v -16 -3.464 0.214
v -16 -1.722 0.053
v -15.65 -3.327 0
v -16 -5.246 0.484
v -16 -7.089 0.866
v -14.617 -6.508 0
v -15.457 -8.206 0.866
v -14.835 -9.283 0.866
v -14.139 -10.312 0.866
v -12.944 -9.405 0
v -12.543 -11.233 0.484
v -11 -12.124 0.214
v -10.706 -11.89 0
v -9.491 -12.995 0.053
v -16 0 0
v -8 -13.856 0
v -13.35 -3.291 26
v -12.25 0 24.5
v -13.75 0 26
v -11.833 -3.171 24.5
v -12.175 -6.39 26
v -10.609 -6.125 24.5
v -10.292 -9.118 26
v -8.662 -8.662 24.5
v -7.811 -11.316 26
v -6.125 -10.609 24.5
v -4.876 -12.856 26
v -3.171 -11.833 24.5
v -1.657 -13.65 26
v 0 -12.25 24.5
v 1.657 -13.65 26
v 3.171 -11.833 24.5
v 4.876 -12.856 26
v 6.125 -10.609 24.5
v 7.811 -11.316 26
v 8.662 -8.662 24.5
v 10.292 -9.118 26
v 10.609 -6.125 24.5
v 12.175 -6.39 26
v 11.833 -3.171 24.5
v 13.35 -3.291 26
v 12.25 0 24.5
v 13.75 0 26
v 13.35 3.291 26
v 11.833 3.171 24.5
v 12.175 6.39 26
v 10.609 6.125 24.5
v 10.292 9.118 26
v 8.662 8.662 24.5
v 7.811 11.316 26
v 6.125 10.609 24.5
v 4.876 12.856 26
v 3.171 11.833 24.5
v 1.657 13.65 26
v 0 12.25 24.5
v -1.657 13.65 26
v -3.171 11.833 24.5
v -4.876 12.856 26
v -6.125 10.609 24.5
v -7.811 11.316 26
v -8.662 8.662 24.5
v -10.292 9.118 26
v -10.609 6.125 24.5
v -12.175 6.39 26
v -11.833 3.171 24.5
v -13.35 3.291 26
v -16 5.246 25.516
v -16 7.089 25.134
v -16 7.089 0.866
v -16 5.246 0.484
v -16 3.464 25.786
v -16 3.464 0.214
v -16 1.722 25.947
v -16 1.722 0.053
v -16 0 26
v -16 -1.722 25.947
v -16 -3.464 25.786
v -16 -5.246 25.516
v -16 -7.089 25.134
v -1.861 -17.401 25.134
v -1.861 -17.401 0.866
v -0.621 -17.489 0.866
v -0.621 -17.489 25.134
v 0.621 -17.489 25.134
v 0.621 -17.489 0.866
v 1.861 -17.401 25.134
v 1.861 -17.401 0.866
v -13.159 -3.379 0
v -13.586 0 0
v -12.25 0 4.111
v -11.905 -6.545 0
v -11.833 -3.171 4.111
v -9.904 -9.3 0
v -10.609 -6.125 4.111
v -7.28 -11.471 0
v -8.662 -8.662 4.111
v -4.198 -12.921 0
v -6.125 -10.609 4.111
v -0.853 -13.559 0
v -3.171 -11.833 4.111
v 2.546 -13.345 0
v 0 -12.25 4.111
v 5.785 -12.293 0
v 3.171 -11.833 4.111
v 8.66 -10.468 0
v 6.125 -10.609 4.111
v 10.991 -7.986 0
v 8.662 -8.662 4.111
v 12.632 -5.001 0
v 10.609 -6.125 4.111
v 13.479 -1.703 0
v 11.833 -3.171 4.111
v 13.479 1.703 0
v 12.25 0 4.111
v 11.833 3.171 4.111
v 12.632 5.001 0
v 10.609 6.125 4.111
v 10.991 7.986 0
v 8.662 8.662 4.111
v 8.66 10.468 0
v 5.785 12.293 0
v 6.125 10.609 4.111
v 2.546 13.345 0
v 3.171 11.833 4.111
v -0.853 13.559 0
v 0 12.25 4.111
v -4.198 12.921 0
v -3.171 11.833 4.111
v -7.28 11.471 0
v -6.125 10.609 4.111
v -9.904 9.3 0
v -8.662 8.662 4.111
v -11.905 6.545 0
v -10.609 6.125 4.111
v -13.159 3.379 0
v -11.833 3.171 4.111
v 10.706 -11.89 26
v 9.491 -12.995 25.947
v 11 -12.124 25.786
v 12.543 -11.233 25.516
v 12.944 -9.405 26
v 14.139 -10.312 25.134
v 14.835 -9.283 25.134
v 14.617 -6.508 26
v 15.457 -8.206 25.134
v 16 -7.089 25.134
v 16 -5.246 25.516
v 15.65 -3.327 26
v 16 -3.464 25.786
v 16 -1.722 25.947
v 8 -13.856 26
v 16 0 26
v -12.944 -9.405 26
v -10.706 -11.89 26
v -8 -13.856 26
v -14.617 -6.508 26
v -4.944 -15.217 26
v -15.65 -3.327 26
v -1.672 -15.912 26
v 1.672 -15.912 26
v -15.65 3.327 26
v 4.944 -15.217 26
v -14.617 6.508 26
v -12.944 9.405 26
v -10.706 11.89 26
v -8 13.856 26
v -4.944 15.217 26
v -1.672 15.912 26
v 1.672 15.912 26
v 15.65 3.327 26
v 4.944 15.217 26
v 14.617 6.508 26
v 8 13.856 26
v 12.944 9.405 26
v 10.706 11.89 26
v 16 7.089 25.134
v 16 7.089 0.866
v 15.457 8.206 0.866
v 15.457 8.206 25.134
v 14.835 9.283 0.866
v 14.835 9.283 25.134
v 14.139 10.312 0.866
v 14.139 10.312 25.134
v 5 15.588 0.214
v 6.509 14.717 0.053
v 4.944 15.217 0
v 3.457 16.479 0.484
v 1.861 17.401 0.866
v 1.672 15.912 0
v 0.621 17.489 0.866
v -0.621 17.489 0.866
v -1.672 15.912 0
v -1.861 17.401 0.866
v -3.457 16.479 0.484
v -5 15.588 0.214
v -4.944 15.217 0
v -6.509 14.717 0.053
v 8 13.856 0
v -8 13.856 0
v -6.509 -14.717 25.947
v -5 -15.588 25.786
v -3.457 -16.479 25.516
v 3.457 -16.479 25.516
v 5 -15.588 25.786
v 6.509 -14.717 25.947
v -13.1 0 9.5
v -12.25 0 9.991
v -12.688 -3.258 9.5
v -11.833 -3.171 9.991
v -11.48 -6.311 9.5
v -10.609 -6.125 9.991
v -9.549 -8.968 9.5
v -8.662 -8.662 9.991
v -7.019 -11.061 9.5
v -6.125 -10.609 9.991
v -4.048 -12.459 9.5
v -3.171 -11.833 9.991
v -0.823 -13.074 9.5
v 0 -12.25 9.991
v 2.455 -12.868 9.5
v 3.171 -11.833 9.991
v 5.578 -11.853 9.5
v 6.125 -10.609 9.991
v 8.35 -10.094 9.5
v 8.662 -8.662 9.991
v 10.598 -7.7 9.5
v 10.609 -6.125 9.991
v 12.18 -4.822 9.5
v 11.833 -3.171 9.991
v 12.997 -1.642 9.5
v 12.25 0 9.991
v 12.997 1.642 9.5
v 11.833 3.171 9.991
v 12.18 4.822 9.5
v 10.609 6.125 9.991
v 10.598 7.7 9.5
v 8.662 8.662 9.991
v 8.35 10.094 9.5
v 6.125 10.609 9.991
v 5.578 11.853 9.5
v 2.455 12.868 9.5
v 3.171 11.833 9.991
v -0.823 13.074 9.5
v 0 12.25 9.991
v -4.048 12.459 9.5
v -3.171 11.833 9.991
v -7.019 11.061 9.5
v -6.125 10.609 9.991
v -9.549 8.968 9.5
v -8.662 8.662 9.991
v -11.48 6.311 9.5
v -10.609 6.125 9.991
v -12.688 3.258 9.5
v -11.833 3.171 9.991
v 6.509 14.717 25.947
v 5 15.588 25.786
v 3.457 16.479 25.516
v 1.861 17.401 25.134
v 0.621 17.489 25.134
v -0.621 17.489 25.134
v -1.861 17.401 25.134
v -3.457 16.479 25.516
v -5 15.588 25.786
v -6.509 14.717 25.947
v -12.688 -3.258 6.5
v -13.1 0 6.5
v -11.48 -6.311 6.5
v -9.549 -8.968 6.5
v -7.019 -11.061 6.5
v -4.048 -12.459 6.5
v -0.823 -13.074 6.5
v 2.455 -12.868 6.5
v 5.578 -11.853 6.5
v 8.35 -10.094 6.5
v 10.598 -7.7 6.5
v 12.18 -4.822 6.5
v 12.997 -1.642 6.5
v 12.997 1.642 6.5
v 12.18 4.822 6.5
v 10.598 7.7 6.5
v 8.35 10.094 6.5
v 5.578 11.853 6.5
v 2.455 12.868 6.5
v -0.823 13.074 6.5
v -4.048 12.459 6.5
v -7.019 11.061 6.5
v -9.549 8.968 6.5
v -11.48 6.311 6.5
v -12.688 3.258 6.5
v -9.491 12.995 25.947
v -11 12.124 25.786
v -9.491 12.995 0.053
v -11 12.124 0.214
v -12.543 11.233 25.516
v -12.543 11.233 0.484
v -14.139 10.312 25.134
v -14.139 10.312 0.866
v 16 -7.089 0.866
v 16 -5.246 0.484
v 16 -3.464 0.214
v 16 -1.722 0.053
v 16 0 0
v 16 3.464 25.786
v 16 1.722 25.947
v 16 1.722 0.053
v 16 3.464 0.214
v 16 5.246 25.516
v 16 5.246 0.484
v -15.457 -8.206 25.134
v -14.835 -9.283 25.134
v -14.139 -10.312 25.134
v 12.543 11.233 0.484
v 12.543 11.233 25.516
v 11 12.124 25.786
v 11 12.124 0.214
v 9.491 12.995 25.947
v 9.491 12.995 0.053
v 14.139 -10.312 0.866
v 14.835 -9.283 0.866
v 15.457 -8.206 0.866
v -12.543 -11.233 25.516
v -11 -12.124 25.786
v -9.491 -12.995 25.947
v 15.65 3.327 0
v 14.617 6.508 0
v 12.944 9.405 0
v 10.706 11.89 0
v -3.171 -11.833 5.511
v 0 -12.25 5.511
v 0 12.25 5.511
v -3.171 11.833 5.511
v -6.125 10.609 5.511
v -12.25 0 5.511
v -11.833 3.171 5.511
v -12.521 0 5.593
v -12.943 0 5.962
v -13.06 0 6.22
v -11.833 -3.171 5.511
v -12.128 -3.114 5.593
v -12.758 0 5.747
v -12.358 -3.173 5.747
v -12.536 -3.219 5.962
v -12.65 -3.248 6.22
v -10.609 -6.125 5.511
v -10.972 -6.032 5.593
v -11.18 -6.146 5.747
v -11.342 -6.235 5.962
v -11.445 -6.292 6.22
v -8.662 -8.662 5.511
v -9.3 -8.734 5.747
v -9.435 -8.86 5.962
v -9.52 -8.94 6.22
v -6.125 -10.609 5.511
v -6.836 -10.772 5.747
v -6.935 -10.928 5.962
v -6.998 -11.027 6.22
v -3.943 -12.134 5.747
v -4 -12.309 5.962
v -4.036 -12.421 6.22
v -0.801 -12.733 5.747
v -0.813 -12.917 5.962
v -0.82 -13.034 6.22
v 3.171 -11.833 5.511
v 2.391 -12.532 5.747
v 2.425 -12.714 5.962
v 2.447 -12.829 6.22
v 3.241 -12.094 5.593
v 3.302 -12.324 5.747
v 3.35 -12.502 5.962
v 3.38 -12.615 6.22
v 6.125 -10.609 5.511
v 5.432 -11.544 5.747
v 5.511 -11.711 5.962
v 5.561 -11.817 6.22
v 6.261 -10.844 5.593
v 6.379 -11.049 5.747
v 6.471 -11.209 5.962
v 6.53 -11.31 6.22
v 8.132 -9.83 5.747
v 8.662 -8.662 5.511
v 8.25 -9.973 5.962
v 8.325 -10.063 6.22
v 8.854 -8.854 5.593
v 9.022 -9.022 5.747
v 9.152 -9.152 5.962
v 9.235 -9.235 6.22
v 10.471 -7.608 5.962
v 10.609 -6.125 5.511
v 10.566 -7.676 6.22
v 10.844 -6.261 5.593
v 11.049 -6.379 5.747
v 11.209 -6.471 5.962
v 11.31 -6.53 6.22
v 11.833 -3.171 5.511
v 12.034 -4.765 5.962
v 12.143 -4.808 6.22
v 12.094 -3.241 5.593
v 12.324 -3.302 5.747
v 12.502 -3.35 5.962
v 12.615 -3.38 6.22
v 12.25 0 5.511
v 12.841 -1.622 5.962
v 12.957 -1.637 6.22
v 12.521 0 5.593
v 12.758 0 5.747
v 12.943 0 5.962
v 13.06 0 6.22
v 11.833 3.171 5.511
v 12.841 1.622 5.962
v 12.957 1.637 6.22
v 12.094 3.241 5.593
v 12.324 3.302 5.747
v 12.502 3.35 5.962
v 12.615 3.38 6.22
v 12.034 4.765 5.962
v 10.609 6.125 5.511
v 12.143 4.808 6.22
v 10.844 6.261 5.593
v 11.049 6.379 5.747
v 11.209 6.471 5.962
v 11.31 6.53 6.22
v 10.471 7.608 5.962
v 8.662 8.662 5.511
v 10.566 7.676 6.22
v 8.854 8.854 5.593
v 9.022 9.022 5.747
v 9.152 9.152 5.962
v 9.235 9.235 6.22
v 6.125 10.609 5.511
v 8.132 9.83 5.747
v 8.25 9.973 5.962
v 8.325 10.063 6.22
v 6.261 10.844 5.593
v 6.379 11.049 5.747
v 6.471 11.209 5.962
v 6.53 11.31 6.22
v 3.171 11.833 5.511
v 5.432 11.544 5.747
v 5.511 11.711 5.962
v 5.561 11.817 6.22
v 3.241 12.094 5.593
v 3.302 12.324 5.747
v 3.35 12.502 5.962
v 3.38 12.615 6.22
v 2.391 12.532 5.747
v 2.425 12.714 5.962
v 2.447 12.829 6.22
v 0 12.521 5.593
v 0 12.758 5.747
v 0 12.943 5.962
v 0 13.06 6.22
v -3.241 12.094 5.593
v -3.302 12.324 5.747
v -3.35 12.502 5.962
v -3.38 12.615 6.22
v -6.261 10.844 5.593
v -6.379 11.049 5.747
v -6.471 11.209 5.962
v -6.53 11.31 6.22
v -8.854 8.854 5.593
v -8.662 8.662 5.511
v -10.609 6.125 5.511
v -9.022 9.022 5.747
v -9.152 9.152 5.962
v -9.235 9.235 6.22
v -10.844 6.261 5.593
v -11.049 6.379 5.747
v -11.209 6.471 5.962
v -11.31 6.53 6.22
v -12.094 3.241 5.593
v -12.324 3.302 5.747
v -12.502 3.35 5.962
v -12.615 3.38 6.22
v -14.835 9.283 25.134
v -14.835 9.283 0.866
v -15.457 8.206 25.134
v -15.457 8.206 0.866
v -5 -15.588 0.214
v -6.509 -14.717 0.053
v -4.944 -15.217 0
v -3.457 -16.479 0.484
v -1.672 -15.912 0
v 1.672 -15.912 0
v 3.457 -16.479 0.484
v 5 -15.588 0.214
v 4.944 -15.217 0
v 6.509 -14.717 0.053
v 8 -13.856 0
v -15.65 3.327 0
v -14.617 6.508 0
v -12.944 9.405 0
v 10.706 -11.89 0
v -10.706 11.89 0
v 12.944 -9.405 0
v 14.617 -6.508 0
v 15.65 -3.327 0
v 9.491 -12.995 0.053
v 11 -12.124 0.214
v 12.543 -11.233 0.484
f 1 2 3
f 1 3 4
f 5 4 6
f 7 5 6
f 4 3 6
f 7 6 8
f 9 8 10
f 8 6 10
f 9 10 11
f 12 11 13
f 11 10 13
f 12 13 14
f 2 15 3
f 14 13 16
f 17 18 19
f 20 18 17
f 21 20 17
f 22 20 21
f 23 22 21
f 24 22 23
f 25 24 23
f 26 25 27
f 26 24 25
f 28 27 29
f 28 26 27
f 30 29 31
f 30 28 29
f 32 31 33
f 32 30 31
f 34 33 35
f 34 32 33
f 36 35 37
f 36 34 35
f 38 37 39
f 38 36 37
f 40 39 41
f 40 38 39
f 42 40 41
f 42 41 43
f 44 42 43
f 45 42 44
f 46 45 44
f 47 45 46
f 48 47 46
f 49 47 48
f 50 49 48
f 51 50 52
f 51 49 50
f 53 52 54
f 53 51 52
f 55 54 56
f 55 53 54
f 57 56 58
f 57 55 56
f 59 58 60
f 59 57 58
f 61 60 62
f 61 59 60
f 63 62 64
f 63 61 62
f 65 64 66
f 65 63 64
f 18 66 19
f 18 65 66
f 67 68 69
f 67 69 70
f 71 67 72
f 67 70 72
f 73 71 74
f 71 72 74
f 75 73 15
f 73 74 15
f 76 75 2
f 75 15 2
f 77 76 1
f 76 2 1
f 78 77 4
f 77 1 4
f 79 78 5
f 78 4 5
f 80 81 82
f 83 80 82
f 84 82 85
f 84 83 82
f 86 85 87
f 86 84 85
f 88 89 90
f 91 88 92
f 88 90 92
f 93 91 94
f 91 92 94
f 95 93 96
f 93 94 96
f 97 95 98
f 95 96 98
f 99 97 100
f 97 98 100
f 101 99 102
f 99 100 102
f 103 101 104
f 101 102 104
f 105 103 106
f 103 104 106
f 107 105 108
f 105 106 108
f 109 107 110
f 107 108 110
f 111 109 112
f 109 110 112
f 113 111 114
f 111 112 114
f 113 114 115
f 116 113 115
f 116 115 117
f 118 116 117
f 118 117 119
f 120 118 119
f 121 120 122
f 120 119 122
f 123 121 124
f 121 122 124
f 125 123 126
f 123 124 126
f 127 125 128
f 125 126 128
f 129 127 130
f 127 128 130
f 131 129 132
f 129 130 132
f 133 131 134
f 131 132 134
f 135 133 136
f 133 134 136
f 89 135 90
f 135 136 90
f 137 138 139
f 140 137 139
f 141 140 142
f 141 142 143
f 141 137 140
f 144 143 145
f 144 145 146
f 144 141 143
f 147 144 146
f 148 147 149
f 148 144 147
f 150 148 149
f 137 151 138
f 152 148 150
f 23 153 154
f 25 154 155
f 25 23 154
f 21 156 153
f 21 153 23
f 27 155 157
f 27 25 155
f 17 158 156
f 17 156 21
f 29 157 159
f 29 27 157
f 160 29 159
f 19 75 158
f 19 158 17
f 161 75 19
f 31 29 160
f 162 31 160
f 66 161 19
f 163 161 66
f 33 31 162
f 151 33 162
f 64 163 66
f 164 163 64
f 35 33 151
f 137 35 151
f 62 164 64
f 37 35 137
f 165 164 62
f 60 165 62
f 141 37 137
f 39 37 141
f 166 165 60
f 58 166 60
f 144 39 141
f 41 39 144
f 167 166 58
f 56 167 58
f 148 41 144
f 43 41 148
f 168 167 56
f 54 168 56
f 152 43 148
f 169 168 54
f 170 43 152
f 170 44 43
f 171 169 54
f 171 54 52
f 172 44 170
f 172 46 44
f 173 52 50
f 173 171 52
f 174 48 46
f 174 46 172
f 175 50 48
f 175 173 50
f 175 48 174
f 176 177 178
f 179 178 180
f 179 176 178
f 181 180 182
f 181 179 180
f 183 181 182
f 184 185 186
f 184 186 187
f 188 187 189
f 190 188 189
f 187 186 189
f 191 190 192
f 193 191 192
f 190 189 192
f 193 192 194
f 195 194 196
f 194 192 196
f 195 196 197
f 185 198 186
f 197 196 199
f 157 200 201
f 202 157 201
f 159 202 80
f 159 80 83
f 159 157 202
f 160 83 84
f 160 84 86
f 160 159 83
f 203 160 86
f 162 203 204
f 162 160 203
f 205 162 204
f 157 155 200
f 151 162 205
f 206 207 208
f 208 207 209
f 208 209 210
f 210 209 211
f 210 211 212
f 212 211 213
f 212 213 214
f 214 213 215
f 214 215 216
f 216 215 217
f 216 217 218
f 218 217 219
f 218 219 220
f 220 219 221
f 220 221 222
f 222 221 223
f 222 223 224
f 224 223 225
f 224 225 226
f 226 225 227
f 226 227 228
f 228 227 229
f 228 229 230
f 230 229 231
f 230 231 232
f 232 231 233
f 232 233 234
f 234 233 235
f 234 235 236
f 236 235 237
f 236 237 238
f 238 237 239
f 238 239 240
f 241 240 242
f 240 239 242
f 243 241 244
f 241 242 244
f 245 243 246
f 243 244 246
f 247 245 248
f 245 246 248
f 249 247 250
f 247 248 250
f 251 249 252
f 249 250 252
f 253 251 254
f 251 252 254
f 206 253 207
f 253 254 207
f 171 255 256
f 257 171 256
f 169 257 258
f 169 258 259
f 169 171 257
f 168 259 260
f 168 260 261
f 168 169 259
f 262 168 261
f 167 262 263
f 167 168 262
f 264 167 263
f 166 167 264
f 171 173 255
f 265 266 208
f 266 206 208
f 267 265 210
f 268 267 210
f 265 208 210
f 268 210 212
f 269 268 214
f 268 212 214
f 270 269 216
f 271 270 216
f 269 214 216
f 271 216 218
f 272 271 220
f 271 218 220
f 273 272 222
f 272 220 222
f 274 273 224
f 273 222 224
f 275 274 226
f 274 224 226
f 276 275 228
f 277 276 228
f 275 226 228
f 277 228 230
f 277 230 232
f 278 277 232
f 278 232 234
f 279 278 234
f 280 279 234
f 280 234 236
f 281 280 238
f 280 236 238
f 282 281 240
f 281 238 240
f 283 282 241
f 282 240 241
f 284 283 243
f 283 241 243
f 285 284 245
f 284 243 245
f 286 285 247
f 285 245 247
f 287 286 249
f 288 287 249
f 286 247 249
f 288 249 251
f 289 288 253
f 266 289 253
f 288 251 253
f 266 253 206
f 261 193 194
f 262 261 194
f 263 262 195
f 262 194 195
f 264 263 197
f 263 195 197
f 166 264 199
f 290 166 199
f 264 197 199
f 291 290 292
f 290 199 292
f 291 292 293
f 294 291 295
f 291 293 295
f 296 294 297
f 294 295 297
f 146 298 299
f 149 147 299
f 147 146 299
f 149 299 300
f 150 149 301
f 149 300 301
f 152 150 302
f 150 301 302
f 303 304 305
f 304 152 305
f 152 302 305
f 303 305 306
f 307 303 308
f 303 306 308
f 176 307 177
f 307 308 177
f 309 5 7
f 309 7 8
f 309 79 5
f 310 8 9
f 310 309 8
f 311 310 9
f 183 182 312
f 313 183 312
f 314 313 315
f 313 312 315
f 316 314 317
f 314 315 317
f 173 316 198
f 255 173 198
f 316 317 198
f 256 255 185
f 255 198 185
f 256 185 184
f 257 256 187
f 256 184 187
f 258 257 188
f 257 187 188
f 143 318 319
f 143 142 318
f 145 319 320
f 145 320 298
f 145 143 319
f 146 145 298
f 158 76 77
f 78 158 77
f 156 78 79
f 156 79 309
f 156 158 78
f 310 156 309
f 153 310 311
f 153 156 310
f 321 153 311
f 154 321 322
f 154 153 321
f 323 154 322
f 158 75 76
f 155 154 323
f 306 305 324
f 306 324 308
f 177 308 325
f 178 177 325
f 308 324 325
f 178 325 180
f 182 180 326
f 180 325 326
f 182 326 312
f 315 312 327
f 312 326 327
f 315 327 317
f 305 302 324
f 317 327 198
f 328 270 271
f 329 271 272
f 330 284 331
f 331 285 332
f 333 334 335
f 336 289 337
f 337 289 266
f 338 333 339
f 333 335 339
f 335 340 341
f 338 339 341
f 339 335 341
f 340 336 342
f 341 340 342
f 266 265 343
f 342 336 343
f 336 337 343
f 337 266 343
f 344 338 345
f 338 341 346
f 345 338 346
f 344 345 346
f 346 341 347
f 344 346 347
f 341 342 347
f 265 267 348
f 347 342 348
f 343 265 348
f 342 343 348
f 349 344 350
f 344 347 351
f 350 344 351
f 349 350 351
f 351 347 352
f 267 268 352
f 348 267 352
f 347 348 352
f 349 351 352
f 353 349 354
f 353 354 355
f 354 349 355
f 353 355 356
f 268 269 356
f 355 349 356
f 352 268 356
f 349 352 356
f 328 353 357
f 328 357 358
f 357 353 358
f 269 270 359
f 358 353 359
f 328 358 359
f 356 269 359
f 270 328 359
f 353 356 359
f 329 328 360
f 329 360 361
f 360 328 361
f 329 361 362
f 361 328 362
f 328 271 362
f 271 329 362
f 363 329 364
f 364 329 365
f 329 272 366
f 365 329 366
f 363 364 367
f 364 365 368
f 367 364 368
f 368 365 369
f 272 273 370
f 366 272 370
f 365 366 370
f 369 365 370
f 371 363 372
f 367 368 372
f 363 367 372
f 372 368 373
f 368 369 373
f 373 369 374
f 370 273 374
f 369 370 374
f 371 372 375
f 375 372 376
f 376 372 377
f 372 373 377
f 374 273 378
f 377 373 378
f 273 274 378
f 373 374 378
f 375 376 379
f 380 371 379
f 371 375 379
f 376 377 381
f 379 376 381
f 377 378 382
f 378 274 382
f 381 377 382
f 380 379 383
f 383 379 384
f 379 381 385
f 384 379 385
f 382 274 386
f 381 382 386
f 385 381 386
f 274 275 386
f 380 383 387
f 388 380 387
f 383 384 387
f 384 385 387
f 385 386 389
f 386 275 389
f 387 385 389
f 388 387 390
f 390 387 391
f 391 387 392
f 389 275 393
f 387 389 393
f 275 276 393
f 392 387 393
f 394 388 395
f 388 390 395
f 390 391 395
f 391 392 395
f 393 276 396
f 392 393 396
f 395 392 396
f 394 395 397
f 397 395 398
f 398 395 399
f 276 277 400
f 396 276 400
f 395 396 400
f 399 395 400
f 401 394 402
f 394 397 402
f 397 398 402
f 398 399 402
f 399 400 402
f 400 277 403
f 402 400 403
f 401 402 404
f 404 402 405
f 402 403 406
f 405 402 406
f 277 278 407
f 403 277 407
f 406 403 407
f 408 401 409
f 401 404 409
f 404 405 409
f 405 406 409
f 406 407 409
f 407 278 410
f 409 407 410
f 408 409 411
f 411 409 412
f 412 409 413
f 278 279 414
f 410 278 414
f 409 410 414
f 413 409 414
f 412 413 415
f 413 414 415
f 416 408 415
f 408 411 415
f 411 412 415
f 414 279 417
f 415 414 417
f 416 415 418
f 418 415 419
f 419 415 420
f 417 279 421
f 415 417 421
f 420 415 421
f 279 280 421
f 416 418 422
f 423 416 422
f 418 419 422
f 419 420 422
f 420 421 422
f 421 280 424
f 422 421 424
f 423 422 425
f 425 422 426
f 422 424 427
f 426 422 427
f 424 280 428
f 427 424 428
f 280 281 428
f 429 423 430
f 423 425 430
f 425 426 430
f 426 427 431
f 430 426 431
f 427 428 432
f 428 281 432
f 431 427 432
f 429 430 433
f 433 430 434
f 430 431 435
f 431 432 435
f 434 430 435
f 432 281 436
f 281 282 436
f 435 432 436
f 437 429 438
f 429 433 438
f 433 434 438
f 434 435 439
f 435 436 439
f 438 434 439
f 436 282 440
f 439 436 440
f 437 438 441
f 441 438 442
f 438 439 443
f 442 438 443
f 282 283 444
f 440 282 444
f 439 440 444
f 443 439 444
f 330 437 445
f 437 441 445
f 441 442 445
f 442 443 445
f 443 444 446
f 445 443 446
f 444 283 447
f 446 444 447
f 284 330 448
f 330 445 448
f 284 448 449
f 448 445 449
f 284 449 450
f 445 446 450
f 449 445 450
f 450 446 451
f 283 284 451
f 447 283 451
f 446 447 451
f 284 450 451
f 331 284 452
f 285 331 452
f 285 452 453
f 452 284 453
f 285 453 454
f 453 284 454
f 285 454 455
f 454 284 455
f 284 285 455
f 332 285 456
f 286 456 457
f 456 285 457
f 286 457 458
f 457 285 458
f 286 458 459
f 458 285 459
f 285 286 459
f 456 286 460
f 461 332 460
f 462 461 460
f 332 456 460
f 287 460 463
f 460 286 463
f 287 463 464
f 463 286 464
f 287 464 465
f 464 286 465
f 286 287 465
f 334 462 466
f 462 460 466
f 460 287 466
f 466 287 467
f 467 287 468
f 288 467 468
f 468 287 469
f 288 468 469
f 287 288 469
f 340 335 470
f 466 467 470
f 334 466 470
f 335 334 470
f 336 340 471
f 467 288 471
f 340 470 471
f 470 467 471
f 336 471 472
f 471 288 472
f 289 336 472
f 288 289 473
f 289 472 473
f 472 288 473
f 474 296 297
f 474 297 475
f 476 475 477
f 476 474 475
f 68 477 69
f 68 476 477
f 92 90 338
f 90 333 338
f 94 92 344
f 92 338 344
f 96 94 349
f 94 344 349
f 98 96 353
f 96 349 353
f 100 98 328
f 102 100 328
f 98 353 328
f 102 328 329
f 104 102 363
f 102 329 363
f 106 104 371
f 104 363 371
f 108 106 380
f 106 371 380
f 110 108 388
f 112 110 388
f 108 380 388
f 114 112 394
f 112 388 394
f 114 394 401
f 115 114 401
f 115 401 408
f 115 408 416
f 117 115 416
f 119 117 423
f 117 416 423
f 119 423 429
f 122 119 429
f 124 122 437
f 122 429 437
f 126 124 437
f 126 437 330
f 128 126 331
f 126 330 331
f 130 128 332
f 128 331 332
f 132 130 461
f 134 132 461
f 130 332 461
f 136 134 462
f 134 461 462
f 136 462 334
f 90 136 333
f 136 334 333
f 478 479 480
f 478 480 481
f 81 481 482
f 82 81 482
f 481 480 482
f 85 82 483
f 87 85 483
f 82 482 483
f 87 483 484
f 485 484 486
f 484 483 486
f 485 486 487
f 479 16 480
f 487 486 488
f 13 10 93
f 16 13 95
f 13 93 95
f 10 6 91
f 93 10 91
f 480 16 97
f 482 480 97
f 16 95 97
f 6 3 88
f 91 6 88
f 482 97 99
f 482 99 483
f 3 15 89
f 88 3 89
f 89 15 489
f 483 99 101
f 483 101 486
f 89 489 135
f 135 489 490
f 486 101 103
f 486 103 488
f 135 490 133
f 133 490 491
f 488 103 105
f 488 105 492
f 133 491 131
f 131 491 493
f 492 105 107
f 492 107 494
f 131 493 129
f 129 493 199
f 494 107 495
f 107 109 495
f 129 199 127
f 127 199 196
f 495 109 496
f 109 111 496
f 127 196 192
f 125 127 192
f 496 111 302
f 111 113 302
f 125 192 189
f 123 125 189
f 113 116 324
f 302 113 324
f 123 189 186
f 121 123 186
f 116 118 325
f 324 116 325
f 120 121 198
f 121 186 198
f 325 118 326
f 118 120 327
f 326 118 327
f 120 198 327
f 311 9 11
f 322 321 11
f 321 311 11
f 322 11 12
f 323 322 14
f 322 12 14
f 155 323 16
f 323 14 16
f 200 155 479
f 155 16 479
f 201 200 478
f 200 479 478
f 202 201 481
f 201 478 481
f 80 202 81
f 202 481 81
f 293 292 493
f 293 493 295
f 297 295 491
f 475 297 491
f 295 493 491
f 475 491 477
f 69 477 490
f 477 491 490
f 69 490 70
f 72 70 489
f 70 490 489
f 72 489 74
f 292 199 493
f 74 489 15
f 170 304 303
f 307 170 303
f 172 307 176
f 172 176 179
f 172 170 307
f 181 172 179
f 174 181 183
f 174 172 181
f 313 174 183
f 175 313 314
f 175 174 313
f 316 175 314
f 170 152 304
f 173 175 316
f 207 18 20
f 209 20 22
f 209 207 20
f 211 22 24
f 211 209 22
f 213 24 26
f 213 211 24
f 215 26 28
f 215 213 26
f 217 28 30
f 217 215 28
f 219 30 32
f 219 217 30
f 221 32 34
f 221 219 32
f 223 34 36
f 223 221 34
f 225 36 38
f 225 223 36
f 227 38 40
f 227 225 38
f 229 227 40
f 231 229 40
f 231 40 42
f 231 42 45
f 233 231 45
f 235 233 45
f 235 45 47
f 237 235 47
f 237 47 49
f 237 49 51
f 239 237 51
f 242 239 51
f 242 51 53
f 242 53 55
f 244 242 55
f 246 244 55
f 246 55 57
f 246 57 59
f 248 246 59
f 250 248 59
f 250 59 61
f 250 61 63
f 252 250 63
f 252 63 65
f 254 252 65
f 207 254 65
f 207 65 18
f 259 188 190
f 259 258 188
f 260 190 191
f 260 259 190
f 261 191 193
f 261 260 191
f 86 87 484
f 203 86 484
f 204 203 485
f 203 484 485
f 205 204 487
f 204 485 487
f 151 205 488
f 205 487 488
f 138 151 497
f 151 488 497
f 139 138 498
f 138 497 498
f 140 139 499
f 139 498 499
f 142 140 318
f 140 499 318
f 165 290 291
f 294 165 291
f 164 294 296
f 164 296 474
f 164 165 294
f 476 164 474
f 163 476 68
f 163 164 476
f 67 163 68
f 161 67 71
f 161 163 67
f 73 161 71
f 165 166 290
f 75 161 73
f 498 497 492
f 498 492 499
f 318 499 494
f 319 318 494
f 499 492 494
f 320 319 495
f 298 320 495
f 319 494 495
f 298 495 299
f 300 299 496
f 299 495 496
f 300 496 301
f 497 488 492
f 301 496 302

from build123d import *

# Parameters (mm, degrees)
SKETCH_1_R          = 12.25
EXTRUDE_1_DEPTH     = 26
SKETCH_7_OUTSIDE_W  = 45.074
SKETCH_7_OUTSIDE_H  = 50.024
SKETCH_7_OUTSIDE_R  = 17.5
CUT_EXTRUDE_2_DEPTH = 36.68379651
CHAMFER_1_SIZE      = 1.5


with BuildPart() as part:
    # Эскиз1 → Бобышка-Вытянуть1 (new body)
    with BuildSketch(Plane.XY):
        Polygon((0, 18.475208614), (-16, 9.237604307), (-16, -9.237604307), (0, -18.475208614), (16, -9.237604307), (16, 9.237604307), align=None)
        with Locations(Location((0, 0, 0), (0, 0, 180))):
            Circle(SKETCH_1_R, mode=Mode.SUBTRACT)
    extrude(amount=EXTRUDE_1_DEPTH)

    # Эскиз2 → Вырез-Повернуть1 (revolve, cut)
    with BuildSketch(Plane(origin=(0, 0, 0), x_dir=(0, 0, -1), z_dir=(1, 0, 0))):
        Polygon((0, 19.828002546), (-2.210098301, 19.828002546), (0, 16), align=None)
        Polygon((-23.789901699, 19.828002546), (-26, 16), (-26, 19.828002546), align=None)
    revolve(axis=Axis((0, 0, 0), (0, 0, 1)), mode=Mode.SUBTRACT)

    # Эскиз7 outside → Вырез-Вытянуть2 (cut, through all)
    with BuildSketch(Plane.XY.offset(26)):
        Rectangle(SKETCH_7_OUTSIDE_W, SKETCH_7_OUTSIDE_H)
        Circle(SKETCH_7_OUTSIDE_R, mode=Mode.SUBTRACT)
    extrude(amount=-CUT_EXTRUDE_2_DEPTH, mode=Mode.SUBTRACT)

    # Эскиз3 → Вырез-Повернуть2 (revolve, cut)
    with BuildSketch(Plane(origin=(0, 0, 0), x_dir=(0, 0, -1), z_dir=(1, 0, 0)), mode=Mode.PRIVATE) as cut_revolve_2_sk:
        with BuildLine():
            Line((-9.5, 13.1), (-11.145448267, 10.25))
            Line((-11.145448267, 10.25), (0.758835928, 10.25))
            Line((0.758835928, 10.25), (0.758835928, 13.832407636))
            Line((0.758835928, 13.832407636), (-4.111314003, 12.25))
            Line((-4.111314003, 12.25), (-5.511314003, 12.25))
            ThreePointArc((-5.511314003, 12.25), (-5.848079759, 12.858287544), (-6.5, 13.1))
            Line((-6.5, 13.1), (-9.5, 13.1))
        make_face()
    revolve(cut_revolve_2_sk.sketch.rotate(Axis((0, 0, 0), (0, 0, 1)), 90), axis=Axis((0, 0, 0), (0, 0, 1)), mode=Mode.SUBTRACT)

    # Фаска1
    chamfer_1_edges = [part.edges().sort_by_distance(p)[0] for p in [
        (12.25, 0, 26),
    ]]
    chamfer(chamfer_1_edges, length=CHAMFER_1_SIZE)


solid = part.part
